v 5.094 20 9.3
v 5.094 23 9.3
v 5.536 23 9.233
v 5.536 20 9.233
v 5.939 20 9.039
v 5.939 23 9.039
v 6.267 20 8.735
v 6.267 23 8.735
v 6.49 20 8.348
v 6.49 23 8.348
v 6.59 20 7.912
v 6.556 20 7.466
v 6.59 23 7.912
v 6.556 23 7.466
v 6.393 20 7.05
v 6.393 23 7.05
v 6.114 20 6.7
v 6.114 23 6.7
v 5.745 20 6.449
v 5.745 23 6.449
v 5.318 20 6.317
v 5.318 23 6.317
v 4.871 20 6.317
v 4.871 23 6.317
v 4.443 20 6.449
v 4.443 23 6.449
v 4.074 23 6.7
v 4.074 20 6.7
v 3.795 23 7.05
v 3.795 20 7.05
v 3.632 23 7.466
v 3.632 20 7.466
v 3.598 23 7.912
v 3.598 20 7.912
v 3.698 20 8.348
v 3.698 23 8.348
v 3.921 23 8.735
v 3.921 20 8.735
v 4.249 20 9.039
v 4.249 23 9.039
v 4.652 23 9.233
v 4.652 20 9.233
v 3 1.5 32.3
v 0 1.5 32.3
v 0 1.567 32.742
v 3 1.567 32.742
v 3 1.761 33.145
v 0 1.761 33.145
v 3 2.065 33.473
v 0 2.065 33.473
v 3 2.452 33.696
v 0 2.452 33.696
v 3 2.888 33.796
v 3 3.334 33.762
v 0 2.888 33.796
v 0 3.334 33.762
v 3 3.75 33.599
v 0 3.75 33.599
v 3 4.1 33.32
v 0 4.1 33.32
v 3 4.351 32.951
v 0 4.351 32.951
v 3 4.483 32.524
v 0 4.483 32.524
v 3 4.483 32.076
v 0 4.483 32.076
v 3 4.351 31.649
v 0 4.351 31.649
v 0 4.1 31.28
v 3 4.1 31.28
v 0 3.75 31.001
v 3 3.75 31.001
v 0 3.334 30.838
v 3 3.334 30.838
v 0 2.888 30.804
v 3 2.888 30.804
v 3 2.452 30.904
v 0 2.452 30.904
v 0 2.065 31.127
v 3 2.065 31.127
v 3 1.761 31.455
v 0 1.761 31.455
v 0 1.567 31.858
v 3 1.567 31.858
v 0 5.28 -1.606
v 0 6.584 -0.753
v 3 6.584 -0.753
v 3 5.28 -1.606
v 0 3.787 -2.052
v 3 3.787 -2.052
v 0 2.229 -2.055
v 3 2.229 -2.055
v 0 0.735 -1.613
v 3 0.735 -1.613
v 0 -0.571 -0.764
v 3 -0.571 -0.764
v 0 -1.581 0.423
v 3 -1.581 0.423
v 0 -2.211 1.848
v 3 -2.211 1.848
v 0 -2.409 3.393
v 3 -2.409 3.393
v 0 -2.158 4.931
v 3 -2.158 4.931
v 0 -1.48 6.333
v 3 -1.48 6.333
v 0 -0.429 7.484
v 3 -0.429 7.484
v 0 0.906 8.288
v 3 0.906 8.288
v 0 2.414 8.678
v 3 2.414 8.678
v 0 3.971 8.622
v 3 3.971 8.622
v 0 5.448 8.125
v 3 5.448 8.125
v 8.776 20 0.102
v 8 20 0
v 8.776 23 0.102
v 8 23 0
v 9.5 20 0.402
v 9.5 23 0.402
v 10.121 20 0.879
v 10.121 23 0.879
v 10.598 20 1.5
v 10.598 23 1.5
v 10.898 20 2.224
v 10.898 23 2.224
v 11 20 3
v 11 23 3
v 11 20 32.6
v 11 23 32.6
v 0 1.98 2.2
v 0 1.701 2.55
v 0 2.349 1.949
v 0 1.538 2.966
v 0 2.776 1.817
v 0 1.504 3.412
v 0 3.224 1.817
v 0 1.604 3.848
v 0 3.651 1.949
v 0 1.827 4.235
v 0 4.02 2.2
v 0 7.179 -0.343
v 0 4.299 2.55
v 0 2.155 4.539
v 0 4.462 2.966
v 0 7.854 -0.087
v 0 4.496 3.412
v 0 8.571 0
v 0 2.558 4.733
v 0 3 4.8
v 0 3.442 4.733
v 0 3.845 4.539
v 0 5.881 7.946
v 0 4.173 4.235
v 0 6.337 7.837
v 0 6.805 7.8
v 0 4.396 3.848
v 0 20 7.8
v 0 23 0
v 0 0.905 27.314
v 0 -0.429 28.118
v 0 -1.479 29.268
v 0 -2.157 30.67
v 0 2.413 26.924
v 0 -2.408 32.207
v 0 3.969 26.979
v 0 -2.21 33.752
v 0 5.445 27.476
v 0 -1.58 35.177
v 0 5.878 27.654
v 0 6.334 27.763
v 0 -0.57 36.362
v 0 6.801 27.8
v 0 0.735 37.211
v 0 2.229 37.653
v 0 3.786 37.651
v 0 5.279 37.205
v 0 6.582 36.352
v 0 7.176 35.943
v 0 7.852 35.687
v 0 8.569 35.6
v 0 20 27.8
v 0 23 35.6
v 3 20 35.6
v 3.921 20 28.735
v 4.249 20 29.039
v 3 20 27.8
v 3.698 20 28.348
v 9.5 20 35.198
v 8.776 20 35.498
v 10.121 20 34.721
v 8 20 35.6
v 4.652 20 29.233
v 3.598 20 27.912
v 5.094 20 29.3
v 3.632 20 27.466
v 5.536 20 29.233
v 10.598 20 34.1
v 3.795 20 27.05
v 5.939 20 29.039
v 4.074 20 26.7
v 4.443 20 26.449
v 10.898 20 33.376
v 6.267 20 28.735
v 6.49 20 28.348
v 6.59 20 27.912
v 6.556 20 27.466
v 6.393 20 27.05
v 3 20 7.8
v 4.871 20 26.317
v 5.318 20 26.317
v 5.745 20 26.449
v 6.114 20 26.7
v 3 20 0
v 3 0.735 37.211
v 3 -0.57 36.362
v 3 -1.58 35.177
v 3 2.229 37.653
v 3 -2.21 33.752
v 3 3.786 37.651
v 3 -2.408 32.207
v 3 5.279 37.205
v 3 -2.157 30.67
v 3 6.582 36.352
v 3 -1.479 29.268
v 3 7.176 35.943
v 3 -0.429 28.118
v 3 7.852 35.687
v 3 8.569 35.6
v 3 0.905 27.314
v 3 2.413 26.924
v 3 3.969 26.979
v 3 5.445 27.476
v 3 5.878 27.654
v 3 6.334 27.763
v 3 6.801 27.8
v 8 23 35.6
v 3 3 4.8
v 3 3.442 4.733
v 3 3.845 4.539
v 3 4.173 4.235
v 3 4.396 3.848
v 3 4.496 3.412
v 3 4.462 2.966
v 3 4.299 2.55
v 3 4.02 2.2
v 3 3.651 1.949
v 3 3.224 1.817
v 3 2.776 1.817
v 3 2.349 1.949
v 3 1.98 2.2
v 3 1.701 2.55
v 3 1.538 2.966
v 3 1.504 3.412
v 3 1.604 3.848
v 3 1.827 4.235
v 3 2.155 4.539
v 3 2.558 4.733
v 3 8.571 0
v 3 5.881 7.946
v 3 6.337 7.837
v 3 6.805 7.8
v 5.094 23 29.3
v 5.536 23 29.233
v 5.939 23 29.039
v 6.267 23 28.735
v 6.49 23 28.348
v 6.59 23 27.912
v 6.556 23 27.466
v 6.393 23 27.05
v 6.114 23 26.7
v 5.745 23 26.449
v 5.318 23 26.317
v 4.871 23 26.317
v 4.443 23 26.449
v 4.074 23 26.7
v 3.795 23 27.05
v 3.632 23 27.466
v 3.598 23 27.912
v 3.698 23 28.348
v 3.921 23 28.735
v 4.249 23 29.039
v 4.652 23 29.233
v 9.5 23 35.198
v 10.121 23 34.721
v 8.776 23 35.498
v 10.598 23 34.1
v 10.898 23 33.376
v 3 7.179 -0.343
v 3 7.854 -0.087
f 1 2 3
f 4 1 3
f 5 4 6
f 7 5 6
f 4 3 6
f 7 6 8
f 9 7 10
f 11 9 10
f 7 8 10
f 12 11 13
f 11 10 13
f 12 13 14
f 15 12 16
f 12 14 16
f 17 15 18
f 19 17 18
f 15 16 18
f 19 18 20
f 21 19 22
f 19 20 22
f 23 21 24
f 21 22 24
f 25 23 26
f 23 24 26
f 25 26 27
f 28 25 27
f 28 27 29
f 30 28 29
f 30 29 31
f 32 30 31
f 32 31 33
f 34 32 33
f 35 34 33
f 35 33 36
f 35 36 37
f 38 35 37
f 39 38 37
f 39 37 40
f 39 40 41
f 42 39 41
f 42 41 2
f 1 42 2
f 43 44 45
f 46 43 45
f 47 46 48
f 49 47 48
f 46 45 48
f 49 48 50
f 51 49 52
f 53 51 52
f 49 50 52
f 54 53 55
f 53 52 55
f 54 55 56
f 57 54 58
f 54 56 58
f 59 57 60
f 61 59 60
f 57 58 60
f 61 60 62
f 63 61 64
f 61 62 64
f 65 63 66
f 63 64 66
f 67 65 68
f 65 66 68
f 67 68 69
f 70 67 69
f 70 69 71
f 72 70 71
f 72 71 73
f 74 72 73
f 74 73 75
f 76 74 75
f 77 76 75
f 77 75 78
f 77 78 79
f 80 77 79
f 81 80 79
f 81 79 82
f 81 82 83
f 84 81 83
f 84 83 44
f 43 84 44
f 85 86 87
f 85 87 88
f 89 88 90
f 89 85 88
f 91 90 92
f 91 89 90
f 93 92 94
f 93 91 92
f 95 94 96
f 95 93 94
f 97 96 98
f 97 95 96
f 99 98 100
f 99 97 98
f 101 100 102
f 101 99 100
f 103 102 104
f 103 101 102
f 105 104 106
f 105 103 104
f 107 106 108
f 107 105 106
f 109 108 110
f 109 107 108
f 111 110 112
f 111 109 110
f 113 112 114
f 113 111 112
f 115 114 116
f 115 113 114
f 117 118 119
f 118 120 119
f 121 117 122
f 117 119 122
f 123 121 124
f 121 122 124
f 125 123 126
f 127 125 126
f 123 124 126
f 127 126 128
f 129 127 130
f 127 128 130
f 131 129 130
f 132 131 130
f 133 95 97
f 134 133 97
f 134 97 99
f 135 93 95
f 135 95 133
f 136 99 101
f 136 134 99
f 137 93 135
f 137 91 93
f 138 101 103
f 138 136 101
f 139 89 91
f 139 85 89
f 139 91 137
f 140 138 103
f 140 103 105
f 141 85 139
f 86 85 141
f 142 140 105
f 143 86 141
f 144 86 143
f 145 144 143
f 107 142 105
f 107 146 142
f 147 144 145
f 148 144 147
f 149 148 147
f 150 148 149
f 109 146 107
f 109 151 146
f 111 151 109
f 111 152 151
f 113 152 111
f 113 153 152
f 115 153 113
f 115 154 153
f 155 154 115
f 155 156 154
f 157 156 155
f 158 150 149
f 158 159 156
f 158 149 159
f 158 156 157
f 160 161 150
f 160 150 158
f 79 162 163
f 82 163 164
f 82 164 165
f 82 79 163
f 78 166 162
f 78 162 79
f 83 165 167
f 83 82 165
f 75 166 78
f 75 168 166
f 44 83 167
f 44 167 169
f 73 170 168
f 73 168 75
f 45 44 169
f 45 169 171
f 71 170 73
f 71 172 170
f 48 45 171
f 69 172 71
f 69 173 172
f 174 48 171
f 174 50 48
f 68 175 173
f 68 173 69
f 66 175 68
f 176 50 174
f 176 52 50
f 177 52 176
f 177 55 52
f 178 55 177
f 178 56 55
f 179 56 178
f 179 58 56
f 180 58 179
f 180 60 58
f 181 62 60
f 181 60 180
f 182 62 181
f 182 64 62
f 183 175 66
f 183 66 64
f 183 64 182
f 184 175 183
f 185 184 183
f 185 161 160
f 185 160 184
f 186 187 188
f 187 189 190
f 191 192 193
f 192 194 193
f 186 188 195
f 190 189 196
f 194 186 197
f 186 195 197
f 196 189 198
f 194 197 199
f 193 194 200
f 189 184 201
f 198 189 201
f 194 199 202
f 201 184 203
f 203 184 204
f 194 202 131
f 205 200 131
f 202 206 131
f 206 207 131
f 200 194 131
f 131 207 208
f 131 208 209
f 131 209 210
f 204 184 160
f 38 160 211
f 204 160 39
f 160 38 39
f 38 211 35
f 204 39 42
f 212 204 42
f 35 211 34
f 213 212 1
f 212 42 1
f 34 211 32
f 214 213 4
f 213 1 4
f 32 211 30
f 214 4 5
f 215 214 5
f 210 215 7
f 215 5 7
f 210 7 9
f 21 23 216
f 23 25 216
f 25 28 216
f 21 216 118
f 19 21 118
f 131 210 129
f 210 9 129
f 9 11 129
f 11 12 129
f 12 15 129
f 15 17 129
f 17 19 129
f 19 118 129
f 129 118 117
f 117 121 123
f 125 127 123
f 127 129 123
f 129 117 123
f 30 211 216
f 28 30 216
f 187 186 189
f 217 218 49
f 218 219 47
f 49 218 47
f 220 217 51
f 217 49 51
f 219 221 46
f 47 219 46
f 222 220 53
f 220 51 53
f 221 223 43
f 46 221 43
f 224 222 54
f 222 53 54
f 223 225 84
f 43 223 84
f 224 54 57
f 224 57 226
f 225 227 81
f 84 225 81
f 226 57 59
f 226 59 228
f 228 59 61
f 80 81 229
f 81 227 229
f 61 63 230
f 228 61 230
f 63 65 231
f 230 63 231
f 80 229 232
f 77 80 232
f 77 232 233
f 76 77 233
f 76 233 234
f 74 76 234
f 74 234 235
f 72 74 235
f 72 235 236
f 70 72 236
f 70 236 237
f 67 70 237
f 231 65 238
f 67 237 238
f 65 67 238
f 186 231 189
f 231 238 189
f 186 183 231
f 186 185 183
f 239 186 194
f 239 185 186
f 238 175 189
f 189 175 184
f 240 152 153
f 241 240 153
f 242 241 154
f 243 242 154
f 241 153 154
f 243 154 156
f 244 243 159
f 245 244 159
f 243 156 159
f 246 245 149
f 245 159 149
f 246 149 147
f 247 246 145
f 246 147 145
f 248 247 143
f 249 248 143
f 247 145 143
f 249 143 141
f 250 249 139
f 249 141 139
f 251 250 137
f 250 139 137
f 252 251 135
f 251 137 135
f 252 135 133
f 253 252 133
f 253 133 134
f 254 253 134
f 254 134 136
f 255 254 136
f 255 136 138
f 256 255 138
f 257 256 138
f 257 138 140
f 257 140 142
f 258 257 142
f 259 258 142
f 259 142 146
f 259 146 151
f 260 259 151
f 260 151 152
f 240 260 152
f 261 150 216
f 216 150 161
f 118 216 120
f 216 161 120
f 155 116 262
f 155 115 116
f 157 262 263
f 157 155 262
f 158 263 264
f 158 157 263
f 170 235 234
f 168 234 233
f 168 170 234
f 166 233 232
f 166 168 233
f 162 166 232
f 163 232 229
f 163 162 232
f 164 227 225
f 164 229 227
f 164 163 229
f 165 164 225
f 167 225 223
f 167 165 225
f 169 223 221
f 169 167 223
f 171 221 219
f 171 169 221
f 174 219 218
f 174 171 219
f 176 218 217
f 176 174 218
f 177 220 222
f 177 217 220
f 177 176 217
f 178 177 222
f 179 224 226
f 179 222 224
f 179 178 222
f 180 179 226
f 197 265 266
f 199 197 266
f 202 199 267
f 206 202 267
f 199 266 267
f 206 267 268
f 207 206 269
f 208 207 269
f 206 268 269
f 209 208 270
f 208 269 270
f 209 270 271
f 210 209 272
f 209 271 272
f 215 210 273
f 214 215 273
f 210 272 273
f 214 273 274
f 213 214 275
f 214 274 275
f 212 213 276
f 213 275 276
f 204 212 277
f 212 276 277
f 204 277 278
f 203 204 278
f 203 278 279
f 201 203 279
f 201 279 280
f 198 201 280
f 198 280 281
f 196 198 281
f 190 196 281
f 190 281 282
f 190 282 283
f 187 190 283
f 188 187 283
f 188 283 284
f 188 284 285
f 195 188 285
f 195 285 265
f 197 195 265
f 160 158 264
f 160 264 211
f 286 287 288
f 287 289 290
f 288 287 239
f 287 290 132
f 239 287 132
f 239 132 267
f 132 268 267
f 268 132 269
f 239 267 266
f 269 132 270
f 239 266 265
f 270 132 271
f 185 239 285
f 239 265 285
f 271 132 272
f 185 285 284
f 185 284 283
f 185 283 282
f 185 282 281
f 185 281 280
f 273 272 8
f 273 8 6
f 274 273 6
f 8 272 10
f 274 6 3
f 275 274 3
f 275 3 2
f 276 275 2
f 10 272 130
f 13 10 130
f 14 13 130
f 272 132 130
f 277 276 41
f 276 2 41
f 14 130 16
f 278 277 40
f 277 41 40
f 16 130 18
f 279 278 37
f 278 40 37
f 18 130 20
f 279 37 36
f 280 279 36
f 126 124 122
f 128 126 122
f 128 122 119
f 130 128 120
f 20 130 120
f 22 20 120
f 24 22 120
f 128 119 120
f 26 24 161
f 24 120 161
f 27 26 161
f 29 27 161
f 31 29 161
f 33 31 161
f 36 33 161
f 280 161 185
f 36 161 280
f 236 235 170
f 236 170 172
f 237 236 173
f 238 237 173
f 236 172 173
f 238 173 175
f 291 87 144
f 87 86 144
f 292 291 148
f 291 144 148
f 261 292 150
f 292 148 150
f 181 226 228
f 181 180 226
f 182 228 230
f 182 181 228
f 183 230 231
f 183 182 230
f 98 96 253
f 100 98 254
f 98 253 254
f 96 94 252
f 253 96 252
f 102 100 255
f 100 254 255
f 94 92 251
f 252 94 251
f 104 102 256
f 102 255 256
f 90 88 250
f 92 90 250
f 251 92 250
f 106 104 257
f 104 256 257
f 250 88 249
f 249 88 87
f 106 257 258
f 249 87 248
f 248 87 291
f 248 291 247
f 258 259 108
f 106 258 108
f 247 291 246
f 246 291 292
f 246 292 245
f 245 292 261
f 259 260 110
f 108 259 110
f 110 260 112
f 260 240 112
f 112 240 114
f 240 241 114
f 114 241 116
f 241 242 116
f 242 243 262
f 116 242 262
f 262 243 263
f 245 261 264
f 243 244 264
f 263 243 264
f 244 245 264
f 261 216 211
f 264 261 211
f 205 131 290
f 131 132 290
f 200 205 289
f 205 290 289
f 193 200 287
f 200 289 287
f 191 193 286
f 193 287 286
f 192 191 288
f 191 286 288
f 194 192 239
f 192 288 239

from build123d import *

# Parameters (mm, degrees)
EXTRUDE_1_DEPTH     = 35.6
SKETCH_3_R          = 1.5
SKETCH_3_W          = 20
SKETCH_3_H          = 35
CUT_EXTRUDE_1_DEPTH = 54.219921082
SKETCH_4_R          = 1.5
CUT_EXTRUDE_2_DEPTH = 54.219921082
FILLET_1_R          = 3
SKETCH_6_R          = 5.41
SKETCH_6_R_2        = 1.5
SKETCH_6_R_3        = 5.408326913
EXTRUDE_2_DEPTH     = 3
FILLET_2_R          = 3
SKETCH_7_W          = 3
SKETCH_7_H          = 15
CUT_EXTRUDE_3_DEPTH = 59


with BuildPart() as part:
    # 草图1 → 凸台-拉伸1 (new body)
    with BuildSketch(Plane.XY):
        Polygon((0, 0), (3, 0), (3, 35), (11, 35), (11, 38), (0, 38), align=None)
    extrude(amount=EXTRUDE_1_DEPTH)

    # 草图3 → 切除-拉伸1 (cut, through all)
    with BuildSketch(Plane.ZY):
        with Locations((3.3, 3)):
            Circle(SKETCH_3_R)
        with Locations((32.3, 3)):
            Circle(SKETCH_3_R)
        with Locations((17.8, 17.5)):
            Rectangle(SKETCH_3_W, SKETCH_3_H)
    extrude(amount=-CUT_EXTRUDE_1_DEPTH, mode=Mode.SUBTRACT)

    # 草图4 → 切除-拉伸2 (cut, through all)
    with BuildSketch(Plane(origin=(0, 38, 0), x_dir=(1, 0, 0), z_dir=(0, 1, 0))):
        with Locations((5.094069653, -7.8)):
            Circle(SKETCH_4_R)
        with Locations((5.094069653, -27.8)):
            Circle(SKETCH_4_R)
    extrude(amount=-CUT_EXTRUDE_2_DEPTH, mode=Mode.SUBTRACT)

    # 圆角1
    fillet_1_edges = [part.edges().sort_by_distance(p)[0] for p in [
        (11, 36.5, 0),
        (11, 36.5, 35.6),
    ]]
    fillet(fillet_1_edges, radius=FILLET_1_R)

    # 草图6 → 凸台-拉伸2 (add)
    # profile 1 of 2: a face of its own
    with BuildSketch(Plane.ZY):
        with Locations((3.3, 3)):
            Circle(SKETCH_6_R)
        with Locations((3.3, 3)):
            Circle(SKETCH_6_R_2, mode=Mode.SUBTRACT)
    # profile 2 of 2: a face of its own
    with BuildSketch(Plane.ZY):
        with Locations((32.3, 3)):
            Circle(SKETCH_6_R_3)
        with Locations((32.3, 3)):
            Circle(SKETCH_6_R_2, mode=Mode.SUBTRACT)
    extrude(amount=-EXTRUDE_2_DEPTH)

    # 圆角2
    fillet_2_edges = [part.edges().sort_by_distance(p)[0] for p in [
        (1.5, 6, 27.8),
        (1.5, 7.284857057, 35.6),
        (1.5, 6.003015151, 7.8),
        (1.5, 7.286968626, 0),
    ]]
    fillet(fillet_2_edges, radius=FILLET_2_R)

    # 草图7 → 切除-拉伸3 (cut)
    with BuildSketch(Plane.XY.offset(35.6)):
        with Locations((1.5, 25.41705132)):
            Rectangle(SKETCH_7_W, SKETCH_7_H)
    extrude(amount=-CUT_EXTRUDE_3_DEPTH, mode=Mode.SUBTRACT)


with BuildPart() as cut_extrude_3_piece_1:
    # of the separate pieces the step leaves, piece 1, a body of its own (cut_extrude_3_pieces)
    add(part.part.solids().sort_by_distance((0, 32.91705132, 0))[0])


with BuildPart() as cut_extrude_3_piece_2:
    # of the separate pieces the step leaves, piece 2, a body of its own (cut_extrude_3_pieces)
    add(part.part.solids().sort_by_distance((3, 8.571184793, 0))[0])


with BuildPart() as cut_extrude_3_piece_3:
    # of the separate pieces the step leaves, piece 3, a body of its own (cut_extrude_3_pieces)
    add(part.part.solids().sort_by_distance((0, 17.91705132, 35.6))[0])


with BuildPart() as cut_extrude_3_piece_1_1:
    # Move Body 1: moved
    add(cut_extrude_3_piece_1.part.moved(Location((0, -15, 0))))

    # Combine 3: union 切除-拉伸3 piece 2, 切除-拉伸3 piece 3
    add(cut_extrude_3_piece_2.part)
    add(cut_extrude_3_piece_3.part)


solid = cut_extrude_3_piece_1_1.part
